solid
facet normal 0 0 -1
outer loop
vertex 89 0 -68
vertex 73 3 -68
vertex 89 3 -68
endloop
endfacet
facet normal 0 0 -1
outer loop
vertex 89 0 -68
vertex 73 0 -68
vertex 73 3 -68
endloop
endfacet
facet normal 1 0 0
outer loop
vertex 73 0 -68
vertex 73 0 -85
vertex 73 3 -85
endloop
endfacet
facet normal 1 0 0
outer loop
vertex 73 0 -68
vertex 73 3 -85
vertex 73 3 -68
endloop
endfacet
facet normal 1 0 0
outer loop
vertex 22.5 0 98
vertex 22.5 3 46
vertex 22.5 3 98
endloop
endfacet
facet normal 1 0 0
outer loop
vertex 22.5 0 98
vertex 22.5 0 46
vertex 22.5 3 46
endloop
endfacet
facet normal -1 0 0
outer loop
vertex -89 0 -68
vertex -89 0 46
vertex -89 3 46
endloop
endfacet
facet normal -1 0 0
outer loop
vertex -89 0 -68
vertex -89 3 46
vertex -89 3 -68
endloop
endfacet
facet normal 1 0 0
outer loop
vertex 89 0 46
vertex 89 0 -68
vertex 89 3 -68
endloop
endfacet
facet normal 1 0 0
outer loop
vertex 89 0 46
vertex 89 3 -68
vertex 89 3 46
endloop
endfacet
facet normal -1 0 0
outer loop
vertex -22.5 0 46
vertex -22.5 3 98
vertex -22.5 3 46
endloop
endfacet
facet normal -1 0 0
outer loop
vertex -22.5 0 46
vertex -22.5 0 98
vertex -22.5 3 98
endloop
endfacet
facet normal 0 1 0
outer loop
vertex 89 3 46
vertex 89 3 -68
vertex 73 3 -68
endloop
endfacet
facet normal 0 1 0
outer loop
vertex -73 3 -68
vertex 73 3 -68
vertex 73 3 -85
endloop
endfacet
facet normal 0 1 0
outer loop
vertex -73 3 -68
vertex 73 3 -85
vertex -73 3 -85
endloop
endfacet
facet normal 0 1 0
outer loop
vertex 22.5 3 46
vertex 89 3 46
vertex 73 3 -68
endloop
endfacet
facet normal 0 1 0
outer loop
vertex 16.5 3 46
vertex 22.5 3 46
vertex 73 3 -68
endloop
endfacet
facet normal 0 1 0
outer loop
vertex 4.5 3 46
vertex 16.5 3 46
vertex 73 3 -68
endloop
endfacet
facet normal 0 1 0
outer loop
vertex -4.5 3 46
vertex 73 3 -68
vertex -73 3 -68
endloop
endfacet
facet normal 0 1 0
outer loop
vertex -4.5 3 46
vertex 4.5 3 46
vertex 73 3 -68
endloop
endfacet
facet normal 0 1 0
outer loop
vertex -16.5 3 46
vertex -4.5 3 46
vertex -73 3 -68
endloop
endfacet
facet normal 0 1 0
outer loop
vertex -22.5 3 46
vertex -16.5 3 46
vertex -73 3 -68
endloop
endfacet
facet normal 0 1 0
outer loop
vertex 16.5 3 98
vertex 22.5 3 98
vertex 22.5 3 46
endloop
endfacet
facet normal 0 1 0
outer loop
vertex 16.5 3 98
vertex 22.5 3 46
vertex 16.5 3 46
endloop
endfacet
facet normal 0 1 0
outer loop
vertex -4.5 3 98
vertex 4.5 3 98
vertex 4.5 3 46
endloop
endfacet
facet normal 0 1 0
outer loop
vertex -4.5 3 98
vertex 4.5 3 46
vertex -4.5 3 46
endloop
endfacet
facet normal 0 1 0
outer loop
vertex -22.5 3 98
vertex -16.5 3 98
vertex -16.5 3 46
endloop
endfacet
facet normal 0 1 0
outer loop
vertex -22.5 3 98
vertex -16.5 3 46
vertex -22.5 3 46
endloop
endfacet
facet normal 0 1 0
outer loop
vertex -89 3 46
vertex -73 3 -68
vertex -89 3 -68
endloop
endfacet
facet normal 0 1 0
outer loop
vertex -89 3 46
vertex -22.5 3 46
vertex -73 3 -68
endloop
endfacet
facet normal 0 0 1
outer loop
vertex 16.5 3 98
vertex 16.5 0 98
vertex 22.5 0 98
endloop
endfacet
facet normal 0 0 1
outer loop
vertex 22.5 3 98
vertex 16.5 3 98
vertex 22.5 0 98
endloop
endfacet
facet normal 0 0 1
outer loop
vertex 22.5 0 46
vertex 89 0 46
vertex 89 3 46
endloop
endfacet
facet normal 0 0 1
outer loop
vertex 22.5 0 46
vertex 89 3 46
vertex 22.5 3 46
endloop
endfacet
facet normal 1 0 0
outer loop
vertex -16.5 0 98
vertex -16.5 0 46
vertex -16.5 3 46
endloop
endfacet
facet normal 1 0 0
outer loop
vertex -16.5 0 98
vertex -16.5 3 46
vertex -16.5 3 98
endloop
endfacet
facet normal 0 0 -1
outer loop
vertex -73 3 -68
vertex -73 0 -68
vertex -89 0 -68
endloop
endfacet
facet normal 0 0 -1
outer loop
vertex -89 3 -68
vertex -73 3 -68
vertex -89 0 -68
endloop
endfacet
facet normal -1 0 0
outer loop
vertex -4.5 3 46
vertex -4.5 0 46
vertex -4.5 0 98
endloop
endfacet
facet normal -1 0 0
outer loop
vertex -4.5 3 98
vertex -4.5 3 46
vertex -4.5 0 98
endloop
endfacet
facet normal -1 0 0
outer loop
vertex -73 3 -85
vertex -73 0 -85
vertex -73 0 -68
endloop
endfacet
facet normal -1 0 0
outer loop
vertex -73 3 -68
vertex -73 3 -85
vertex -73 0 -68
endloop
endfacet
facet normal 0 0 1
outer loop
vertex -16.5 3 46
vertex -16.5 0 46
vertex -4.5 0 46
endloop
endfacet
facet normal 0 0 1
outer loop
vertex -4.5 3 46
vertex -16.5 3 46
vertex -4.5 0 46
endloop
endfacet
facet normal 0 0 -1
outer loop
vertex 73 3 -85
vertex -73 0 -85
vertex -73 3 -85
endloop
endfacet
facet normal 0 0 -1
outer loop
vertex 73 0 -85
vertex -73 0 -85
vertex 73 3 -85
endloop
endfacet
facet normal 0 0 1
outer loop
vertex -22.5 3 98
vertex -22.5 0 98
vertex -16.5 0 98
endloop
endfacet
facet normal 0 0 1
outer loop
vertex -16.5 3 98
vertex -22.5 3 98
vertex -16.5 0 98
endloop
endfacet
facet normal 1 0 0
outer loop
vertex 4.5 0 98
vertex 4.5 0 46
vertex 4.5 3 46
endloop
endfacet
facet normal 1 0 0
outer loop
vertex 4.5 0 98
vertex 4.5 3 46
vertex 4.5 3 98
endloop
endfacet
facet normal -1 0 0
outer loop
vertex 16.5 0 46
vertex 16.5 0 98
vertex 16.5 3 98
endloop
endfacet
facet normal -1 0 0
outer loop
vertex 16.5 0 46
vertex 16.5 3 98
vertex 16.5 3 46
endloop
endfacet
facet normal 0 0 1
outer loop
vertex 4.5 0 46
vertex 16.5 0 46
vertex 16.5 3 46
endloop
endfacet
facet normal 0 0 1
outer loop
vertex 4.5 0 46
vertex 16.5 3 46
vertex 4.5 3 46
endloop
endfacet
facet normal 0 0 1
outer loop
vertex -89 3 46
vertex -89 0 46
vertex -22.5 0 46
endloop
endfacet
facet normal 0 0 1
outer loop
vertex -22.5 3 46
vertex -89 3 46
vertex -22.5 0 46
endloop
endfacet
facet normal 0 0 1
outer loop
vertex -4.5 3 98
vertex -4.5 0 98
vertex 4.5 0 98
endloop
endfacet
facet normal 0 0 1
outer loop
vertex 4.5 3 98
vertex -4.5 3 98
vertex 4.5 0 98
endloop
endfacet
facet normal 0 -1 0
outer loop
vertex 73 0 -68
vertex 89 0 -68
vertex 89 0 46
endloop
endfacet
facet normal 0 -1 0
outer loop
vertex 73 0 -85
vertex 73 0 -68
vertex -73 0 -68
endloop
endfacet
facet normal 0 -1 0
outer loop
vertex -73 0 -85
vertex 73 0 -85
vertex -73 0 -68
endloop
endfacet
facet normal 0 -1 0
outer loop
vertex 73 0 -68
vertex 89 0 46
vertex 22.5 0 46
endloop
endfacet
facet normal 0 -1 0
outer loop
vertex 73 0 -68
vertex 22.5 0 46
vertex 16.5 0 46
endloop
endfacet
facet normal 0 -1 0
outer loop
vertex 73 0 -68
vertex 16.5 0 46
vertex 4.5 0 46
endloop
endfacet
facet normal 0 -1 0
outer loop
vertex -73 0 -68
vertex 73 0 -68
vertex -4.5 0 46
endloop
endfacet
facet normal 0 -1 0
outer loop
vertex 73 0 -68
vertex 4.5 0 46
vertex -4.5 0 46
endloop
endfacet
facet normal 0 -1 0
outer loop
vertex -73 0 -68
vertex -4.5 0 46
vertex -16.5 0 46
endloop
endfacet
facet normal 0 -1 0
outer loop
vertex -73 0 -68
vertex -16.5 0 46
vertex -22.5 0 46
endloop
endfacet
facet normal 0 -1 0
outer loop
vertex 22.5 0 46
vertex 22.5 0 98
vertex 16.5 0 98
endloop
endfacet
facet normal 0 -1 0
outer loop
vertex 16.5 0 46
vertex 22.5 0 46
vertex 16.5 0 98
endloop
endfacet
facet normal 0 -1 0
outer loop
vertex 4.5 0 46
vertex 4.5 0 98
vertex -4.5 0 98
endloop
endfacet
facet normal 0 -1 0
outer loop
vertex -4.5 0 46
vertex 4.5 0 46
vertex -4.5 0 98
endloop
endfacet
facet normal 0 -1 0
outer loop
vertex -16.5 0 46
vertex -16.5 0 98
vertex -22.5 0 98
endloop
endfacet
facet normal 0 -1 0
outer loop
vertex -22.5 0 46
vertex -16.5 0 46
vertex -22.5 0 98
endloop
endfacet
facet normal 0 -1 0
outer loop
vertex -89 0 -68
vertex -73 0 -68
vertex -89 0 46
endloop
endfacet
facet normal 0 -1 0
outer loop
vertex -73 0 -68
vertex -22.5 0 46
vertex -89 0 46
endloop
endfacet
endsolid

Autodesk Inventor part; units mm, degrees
ref_plane "YZ Plane" through (0, 0, 0) normal (1, 0, 0) x (0, 1, 0)
ref_plane "XZ Plane" through (0, 0, 0) normal (0, 1, 0) x (-1, 0, 0)
ref_plane "XY Plane" through (0, 0, 0) normal (0, 0, 1) x (1, 0, 0)
sketch "Sketch2" plane through (0, 0, 0) normal (0, 1, 0) x (-1, 0, 0)
  line L0 (-89, 99) -> (89, 99)
  line L1 (89, 99) -> (89, -99)
  line L2 (89, -99) -> (-89, -99)
  line L3 (-89, -99) -> (-89, 99)
  line L4 (-89, 99) -> (89, -99) construction
  line L5 (89, 99) -> (-89, -99) construction
  line L6 (-89, 99) -> (89, 99)
  line L7 (89, 99) -> (89, -85)
  line L8 (89, -85) -> (-89, -85)
  line L9 (-89, -85) -> (-89, 99)
  line L10 (-4.5, 99) -> (-89, 99)
  line L11 (-89, 99) -> (-89, 46)
  line L12 (-89, 46) -> (-4.5, 46)
  line L13 (-4.5, 46) -> (-4.5, 99)
  line L14 (4.5, 99) -> (89, 99)
  line L15 (89, 99) -> (89, 46)
  line L16 (89, 46) -> (4.5, 46)
  line L17 (4.5, 46) -> (4.5, 99)
  line L18 (22.5, 77.5) -> (22.5, 66.5) projected
  line L19 (16.5, 66.5) -> (16.5, 77.5) projected
  line L20 (-22.5, 66.5) -> (-22.5, 77.5) projected
  line L21 (-16.5, 77.5) -> (-16.5, 66.5) projected
  line L22 (-22.5, 99) -> (-16.5, 99)
  line L23 (-16.5, 99) -> (-16.5, 46)
  line L24 (-16.5, 46) -> (-22.5, 46)
  line L25 (-22.5, 46) -> (-22.5, 99)
  line L26 (16.5, 99) -> (22.5, 99)
  line L27 (22.5, 99) -> (22.5, 46)
  line L28 (22.5, 46) -> (16.5, 46)
  line L29 (16.5, 46) -> (16.5, 99)
  line L30 (-89, 99) -> (89, 99)
  line L31 (89, 99) -> (89, 98)
  line L32 (89, 98) -> (-89, 98)
  line L33 (-89, 98) -> (-89, 99)
  line L34 (89, -85) -> (73, -85)
  line L35 (73, -85) -> (73, -68)
  line L36 (73, -68) -> (89, -68)
  line L37 (89, -68) -> (89, -85)
  line L38 (-89, -85) -> (-73, -85)
  line L39 (-73, -85) -> (-73, -68)
  line L40 (-73, -68) -> (-89, -68)
  line L41 (-89, -68) -> (-89, -85)
  point P0 (0, 0)
  point P1 (4.5, 99)
  point P2 (-4.5, 99)
  point P3 (-89, 46)
  point P4 (89, 46)
  point P5 (4.5, 98)
  point P6 (-4.5, 98)
  point P7 (-16.5, 98)
  point P8 (-22.5, 98)
  point P9 (22.5, 98)
  point P10 (16.5, 98)
  point P11 (73, -85)
  dimension "d8" = 178
  dimension "d9" = 198
  dimension "d10" = 14
  dimension "d11" = 84.5
  dimension "d12" = 53
  dimension "d13" = 84.5
  dimension "d14" = 53
  dimension "d17" = 9
  dimension "d18" = 1
  dimension "d19" = 16
  dimension "d20" = 17
  dimension "d21" = 16
  dimension "d22" = 17
extrude "Extrusion2" add sketch "Sketch2" along normal blind 3 contours L32 L23 L21 L12 L25 L20 | L12 L13 L32 L17 L16 L1 L36 L35 L8 L39 L40 L3 | L32 L27 L18 L16 L29 L19
equation "\"d11\" = d13"
properties part number "base" material "Aluminum 6061-AHC"
